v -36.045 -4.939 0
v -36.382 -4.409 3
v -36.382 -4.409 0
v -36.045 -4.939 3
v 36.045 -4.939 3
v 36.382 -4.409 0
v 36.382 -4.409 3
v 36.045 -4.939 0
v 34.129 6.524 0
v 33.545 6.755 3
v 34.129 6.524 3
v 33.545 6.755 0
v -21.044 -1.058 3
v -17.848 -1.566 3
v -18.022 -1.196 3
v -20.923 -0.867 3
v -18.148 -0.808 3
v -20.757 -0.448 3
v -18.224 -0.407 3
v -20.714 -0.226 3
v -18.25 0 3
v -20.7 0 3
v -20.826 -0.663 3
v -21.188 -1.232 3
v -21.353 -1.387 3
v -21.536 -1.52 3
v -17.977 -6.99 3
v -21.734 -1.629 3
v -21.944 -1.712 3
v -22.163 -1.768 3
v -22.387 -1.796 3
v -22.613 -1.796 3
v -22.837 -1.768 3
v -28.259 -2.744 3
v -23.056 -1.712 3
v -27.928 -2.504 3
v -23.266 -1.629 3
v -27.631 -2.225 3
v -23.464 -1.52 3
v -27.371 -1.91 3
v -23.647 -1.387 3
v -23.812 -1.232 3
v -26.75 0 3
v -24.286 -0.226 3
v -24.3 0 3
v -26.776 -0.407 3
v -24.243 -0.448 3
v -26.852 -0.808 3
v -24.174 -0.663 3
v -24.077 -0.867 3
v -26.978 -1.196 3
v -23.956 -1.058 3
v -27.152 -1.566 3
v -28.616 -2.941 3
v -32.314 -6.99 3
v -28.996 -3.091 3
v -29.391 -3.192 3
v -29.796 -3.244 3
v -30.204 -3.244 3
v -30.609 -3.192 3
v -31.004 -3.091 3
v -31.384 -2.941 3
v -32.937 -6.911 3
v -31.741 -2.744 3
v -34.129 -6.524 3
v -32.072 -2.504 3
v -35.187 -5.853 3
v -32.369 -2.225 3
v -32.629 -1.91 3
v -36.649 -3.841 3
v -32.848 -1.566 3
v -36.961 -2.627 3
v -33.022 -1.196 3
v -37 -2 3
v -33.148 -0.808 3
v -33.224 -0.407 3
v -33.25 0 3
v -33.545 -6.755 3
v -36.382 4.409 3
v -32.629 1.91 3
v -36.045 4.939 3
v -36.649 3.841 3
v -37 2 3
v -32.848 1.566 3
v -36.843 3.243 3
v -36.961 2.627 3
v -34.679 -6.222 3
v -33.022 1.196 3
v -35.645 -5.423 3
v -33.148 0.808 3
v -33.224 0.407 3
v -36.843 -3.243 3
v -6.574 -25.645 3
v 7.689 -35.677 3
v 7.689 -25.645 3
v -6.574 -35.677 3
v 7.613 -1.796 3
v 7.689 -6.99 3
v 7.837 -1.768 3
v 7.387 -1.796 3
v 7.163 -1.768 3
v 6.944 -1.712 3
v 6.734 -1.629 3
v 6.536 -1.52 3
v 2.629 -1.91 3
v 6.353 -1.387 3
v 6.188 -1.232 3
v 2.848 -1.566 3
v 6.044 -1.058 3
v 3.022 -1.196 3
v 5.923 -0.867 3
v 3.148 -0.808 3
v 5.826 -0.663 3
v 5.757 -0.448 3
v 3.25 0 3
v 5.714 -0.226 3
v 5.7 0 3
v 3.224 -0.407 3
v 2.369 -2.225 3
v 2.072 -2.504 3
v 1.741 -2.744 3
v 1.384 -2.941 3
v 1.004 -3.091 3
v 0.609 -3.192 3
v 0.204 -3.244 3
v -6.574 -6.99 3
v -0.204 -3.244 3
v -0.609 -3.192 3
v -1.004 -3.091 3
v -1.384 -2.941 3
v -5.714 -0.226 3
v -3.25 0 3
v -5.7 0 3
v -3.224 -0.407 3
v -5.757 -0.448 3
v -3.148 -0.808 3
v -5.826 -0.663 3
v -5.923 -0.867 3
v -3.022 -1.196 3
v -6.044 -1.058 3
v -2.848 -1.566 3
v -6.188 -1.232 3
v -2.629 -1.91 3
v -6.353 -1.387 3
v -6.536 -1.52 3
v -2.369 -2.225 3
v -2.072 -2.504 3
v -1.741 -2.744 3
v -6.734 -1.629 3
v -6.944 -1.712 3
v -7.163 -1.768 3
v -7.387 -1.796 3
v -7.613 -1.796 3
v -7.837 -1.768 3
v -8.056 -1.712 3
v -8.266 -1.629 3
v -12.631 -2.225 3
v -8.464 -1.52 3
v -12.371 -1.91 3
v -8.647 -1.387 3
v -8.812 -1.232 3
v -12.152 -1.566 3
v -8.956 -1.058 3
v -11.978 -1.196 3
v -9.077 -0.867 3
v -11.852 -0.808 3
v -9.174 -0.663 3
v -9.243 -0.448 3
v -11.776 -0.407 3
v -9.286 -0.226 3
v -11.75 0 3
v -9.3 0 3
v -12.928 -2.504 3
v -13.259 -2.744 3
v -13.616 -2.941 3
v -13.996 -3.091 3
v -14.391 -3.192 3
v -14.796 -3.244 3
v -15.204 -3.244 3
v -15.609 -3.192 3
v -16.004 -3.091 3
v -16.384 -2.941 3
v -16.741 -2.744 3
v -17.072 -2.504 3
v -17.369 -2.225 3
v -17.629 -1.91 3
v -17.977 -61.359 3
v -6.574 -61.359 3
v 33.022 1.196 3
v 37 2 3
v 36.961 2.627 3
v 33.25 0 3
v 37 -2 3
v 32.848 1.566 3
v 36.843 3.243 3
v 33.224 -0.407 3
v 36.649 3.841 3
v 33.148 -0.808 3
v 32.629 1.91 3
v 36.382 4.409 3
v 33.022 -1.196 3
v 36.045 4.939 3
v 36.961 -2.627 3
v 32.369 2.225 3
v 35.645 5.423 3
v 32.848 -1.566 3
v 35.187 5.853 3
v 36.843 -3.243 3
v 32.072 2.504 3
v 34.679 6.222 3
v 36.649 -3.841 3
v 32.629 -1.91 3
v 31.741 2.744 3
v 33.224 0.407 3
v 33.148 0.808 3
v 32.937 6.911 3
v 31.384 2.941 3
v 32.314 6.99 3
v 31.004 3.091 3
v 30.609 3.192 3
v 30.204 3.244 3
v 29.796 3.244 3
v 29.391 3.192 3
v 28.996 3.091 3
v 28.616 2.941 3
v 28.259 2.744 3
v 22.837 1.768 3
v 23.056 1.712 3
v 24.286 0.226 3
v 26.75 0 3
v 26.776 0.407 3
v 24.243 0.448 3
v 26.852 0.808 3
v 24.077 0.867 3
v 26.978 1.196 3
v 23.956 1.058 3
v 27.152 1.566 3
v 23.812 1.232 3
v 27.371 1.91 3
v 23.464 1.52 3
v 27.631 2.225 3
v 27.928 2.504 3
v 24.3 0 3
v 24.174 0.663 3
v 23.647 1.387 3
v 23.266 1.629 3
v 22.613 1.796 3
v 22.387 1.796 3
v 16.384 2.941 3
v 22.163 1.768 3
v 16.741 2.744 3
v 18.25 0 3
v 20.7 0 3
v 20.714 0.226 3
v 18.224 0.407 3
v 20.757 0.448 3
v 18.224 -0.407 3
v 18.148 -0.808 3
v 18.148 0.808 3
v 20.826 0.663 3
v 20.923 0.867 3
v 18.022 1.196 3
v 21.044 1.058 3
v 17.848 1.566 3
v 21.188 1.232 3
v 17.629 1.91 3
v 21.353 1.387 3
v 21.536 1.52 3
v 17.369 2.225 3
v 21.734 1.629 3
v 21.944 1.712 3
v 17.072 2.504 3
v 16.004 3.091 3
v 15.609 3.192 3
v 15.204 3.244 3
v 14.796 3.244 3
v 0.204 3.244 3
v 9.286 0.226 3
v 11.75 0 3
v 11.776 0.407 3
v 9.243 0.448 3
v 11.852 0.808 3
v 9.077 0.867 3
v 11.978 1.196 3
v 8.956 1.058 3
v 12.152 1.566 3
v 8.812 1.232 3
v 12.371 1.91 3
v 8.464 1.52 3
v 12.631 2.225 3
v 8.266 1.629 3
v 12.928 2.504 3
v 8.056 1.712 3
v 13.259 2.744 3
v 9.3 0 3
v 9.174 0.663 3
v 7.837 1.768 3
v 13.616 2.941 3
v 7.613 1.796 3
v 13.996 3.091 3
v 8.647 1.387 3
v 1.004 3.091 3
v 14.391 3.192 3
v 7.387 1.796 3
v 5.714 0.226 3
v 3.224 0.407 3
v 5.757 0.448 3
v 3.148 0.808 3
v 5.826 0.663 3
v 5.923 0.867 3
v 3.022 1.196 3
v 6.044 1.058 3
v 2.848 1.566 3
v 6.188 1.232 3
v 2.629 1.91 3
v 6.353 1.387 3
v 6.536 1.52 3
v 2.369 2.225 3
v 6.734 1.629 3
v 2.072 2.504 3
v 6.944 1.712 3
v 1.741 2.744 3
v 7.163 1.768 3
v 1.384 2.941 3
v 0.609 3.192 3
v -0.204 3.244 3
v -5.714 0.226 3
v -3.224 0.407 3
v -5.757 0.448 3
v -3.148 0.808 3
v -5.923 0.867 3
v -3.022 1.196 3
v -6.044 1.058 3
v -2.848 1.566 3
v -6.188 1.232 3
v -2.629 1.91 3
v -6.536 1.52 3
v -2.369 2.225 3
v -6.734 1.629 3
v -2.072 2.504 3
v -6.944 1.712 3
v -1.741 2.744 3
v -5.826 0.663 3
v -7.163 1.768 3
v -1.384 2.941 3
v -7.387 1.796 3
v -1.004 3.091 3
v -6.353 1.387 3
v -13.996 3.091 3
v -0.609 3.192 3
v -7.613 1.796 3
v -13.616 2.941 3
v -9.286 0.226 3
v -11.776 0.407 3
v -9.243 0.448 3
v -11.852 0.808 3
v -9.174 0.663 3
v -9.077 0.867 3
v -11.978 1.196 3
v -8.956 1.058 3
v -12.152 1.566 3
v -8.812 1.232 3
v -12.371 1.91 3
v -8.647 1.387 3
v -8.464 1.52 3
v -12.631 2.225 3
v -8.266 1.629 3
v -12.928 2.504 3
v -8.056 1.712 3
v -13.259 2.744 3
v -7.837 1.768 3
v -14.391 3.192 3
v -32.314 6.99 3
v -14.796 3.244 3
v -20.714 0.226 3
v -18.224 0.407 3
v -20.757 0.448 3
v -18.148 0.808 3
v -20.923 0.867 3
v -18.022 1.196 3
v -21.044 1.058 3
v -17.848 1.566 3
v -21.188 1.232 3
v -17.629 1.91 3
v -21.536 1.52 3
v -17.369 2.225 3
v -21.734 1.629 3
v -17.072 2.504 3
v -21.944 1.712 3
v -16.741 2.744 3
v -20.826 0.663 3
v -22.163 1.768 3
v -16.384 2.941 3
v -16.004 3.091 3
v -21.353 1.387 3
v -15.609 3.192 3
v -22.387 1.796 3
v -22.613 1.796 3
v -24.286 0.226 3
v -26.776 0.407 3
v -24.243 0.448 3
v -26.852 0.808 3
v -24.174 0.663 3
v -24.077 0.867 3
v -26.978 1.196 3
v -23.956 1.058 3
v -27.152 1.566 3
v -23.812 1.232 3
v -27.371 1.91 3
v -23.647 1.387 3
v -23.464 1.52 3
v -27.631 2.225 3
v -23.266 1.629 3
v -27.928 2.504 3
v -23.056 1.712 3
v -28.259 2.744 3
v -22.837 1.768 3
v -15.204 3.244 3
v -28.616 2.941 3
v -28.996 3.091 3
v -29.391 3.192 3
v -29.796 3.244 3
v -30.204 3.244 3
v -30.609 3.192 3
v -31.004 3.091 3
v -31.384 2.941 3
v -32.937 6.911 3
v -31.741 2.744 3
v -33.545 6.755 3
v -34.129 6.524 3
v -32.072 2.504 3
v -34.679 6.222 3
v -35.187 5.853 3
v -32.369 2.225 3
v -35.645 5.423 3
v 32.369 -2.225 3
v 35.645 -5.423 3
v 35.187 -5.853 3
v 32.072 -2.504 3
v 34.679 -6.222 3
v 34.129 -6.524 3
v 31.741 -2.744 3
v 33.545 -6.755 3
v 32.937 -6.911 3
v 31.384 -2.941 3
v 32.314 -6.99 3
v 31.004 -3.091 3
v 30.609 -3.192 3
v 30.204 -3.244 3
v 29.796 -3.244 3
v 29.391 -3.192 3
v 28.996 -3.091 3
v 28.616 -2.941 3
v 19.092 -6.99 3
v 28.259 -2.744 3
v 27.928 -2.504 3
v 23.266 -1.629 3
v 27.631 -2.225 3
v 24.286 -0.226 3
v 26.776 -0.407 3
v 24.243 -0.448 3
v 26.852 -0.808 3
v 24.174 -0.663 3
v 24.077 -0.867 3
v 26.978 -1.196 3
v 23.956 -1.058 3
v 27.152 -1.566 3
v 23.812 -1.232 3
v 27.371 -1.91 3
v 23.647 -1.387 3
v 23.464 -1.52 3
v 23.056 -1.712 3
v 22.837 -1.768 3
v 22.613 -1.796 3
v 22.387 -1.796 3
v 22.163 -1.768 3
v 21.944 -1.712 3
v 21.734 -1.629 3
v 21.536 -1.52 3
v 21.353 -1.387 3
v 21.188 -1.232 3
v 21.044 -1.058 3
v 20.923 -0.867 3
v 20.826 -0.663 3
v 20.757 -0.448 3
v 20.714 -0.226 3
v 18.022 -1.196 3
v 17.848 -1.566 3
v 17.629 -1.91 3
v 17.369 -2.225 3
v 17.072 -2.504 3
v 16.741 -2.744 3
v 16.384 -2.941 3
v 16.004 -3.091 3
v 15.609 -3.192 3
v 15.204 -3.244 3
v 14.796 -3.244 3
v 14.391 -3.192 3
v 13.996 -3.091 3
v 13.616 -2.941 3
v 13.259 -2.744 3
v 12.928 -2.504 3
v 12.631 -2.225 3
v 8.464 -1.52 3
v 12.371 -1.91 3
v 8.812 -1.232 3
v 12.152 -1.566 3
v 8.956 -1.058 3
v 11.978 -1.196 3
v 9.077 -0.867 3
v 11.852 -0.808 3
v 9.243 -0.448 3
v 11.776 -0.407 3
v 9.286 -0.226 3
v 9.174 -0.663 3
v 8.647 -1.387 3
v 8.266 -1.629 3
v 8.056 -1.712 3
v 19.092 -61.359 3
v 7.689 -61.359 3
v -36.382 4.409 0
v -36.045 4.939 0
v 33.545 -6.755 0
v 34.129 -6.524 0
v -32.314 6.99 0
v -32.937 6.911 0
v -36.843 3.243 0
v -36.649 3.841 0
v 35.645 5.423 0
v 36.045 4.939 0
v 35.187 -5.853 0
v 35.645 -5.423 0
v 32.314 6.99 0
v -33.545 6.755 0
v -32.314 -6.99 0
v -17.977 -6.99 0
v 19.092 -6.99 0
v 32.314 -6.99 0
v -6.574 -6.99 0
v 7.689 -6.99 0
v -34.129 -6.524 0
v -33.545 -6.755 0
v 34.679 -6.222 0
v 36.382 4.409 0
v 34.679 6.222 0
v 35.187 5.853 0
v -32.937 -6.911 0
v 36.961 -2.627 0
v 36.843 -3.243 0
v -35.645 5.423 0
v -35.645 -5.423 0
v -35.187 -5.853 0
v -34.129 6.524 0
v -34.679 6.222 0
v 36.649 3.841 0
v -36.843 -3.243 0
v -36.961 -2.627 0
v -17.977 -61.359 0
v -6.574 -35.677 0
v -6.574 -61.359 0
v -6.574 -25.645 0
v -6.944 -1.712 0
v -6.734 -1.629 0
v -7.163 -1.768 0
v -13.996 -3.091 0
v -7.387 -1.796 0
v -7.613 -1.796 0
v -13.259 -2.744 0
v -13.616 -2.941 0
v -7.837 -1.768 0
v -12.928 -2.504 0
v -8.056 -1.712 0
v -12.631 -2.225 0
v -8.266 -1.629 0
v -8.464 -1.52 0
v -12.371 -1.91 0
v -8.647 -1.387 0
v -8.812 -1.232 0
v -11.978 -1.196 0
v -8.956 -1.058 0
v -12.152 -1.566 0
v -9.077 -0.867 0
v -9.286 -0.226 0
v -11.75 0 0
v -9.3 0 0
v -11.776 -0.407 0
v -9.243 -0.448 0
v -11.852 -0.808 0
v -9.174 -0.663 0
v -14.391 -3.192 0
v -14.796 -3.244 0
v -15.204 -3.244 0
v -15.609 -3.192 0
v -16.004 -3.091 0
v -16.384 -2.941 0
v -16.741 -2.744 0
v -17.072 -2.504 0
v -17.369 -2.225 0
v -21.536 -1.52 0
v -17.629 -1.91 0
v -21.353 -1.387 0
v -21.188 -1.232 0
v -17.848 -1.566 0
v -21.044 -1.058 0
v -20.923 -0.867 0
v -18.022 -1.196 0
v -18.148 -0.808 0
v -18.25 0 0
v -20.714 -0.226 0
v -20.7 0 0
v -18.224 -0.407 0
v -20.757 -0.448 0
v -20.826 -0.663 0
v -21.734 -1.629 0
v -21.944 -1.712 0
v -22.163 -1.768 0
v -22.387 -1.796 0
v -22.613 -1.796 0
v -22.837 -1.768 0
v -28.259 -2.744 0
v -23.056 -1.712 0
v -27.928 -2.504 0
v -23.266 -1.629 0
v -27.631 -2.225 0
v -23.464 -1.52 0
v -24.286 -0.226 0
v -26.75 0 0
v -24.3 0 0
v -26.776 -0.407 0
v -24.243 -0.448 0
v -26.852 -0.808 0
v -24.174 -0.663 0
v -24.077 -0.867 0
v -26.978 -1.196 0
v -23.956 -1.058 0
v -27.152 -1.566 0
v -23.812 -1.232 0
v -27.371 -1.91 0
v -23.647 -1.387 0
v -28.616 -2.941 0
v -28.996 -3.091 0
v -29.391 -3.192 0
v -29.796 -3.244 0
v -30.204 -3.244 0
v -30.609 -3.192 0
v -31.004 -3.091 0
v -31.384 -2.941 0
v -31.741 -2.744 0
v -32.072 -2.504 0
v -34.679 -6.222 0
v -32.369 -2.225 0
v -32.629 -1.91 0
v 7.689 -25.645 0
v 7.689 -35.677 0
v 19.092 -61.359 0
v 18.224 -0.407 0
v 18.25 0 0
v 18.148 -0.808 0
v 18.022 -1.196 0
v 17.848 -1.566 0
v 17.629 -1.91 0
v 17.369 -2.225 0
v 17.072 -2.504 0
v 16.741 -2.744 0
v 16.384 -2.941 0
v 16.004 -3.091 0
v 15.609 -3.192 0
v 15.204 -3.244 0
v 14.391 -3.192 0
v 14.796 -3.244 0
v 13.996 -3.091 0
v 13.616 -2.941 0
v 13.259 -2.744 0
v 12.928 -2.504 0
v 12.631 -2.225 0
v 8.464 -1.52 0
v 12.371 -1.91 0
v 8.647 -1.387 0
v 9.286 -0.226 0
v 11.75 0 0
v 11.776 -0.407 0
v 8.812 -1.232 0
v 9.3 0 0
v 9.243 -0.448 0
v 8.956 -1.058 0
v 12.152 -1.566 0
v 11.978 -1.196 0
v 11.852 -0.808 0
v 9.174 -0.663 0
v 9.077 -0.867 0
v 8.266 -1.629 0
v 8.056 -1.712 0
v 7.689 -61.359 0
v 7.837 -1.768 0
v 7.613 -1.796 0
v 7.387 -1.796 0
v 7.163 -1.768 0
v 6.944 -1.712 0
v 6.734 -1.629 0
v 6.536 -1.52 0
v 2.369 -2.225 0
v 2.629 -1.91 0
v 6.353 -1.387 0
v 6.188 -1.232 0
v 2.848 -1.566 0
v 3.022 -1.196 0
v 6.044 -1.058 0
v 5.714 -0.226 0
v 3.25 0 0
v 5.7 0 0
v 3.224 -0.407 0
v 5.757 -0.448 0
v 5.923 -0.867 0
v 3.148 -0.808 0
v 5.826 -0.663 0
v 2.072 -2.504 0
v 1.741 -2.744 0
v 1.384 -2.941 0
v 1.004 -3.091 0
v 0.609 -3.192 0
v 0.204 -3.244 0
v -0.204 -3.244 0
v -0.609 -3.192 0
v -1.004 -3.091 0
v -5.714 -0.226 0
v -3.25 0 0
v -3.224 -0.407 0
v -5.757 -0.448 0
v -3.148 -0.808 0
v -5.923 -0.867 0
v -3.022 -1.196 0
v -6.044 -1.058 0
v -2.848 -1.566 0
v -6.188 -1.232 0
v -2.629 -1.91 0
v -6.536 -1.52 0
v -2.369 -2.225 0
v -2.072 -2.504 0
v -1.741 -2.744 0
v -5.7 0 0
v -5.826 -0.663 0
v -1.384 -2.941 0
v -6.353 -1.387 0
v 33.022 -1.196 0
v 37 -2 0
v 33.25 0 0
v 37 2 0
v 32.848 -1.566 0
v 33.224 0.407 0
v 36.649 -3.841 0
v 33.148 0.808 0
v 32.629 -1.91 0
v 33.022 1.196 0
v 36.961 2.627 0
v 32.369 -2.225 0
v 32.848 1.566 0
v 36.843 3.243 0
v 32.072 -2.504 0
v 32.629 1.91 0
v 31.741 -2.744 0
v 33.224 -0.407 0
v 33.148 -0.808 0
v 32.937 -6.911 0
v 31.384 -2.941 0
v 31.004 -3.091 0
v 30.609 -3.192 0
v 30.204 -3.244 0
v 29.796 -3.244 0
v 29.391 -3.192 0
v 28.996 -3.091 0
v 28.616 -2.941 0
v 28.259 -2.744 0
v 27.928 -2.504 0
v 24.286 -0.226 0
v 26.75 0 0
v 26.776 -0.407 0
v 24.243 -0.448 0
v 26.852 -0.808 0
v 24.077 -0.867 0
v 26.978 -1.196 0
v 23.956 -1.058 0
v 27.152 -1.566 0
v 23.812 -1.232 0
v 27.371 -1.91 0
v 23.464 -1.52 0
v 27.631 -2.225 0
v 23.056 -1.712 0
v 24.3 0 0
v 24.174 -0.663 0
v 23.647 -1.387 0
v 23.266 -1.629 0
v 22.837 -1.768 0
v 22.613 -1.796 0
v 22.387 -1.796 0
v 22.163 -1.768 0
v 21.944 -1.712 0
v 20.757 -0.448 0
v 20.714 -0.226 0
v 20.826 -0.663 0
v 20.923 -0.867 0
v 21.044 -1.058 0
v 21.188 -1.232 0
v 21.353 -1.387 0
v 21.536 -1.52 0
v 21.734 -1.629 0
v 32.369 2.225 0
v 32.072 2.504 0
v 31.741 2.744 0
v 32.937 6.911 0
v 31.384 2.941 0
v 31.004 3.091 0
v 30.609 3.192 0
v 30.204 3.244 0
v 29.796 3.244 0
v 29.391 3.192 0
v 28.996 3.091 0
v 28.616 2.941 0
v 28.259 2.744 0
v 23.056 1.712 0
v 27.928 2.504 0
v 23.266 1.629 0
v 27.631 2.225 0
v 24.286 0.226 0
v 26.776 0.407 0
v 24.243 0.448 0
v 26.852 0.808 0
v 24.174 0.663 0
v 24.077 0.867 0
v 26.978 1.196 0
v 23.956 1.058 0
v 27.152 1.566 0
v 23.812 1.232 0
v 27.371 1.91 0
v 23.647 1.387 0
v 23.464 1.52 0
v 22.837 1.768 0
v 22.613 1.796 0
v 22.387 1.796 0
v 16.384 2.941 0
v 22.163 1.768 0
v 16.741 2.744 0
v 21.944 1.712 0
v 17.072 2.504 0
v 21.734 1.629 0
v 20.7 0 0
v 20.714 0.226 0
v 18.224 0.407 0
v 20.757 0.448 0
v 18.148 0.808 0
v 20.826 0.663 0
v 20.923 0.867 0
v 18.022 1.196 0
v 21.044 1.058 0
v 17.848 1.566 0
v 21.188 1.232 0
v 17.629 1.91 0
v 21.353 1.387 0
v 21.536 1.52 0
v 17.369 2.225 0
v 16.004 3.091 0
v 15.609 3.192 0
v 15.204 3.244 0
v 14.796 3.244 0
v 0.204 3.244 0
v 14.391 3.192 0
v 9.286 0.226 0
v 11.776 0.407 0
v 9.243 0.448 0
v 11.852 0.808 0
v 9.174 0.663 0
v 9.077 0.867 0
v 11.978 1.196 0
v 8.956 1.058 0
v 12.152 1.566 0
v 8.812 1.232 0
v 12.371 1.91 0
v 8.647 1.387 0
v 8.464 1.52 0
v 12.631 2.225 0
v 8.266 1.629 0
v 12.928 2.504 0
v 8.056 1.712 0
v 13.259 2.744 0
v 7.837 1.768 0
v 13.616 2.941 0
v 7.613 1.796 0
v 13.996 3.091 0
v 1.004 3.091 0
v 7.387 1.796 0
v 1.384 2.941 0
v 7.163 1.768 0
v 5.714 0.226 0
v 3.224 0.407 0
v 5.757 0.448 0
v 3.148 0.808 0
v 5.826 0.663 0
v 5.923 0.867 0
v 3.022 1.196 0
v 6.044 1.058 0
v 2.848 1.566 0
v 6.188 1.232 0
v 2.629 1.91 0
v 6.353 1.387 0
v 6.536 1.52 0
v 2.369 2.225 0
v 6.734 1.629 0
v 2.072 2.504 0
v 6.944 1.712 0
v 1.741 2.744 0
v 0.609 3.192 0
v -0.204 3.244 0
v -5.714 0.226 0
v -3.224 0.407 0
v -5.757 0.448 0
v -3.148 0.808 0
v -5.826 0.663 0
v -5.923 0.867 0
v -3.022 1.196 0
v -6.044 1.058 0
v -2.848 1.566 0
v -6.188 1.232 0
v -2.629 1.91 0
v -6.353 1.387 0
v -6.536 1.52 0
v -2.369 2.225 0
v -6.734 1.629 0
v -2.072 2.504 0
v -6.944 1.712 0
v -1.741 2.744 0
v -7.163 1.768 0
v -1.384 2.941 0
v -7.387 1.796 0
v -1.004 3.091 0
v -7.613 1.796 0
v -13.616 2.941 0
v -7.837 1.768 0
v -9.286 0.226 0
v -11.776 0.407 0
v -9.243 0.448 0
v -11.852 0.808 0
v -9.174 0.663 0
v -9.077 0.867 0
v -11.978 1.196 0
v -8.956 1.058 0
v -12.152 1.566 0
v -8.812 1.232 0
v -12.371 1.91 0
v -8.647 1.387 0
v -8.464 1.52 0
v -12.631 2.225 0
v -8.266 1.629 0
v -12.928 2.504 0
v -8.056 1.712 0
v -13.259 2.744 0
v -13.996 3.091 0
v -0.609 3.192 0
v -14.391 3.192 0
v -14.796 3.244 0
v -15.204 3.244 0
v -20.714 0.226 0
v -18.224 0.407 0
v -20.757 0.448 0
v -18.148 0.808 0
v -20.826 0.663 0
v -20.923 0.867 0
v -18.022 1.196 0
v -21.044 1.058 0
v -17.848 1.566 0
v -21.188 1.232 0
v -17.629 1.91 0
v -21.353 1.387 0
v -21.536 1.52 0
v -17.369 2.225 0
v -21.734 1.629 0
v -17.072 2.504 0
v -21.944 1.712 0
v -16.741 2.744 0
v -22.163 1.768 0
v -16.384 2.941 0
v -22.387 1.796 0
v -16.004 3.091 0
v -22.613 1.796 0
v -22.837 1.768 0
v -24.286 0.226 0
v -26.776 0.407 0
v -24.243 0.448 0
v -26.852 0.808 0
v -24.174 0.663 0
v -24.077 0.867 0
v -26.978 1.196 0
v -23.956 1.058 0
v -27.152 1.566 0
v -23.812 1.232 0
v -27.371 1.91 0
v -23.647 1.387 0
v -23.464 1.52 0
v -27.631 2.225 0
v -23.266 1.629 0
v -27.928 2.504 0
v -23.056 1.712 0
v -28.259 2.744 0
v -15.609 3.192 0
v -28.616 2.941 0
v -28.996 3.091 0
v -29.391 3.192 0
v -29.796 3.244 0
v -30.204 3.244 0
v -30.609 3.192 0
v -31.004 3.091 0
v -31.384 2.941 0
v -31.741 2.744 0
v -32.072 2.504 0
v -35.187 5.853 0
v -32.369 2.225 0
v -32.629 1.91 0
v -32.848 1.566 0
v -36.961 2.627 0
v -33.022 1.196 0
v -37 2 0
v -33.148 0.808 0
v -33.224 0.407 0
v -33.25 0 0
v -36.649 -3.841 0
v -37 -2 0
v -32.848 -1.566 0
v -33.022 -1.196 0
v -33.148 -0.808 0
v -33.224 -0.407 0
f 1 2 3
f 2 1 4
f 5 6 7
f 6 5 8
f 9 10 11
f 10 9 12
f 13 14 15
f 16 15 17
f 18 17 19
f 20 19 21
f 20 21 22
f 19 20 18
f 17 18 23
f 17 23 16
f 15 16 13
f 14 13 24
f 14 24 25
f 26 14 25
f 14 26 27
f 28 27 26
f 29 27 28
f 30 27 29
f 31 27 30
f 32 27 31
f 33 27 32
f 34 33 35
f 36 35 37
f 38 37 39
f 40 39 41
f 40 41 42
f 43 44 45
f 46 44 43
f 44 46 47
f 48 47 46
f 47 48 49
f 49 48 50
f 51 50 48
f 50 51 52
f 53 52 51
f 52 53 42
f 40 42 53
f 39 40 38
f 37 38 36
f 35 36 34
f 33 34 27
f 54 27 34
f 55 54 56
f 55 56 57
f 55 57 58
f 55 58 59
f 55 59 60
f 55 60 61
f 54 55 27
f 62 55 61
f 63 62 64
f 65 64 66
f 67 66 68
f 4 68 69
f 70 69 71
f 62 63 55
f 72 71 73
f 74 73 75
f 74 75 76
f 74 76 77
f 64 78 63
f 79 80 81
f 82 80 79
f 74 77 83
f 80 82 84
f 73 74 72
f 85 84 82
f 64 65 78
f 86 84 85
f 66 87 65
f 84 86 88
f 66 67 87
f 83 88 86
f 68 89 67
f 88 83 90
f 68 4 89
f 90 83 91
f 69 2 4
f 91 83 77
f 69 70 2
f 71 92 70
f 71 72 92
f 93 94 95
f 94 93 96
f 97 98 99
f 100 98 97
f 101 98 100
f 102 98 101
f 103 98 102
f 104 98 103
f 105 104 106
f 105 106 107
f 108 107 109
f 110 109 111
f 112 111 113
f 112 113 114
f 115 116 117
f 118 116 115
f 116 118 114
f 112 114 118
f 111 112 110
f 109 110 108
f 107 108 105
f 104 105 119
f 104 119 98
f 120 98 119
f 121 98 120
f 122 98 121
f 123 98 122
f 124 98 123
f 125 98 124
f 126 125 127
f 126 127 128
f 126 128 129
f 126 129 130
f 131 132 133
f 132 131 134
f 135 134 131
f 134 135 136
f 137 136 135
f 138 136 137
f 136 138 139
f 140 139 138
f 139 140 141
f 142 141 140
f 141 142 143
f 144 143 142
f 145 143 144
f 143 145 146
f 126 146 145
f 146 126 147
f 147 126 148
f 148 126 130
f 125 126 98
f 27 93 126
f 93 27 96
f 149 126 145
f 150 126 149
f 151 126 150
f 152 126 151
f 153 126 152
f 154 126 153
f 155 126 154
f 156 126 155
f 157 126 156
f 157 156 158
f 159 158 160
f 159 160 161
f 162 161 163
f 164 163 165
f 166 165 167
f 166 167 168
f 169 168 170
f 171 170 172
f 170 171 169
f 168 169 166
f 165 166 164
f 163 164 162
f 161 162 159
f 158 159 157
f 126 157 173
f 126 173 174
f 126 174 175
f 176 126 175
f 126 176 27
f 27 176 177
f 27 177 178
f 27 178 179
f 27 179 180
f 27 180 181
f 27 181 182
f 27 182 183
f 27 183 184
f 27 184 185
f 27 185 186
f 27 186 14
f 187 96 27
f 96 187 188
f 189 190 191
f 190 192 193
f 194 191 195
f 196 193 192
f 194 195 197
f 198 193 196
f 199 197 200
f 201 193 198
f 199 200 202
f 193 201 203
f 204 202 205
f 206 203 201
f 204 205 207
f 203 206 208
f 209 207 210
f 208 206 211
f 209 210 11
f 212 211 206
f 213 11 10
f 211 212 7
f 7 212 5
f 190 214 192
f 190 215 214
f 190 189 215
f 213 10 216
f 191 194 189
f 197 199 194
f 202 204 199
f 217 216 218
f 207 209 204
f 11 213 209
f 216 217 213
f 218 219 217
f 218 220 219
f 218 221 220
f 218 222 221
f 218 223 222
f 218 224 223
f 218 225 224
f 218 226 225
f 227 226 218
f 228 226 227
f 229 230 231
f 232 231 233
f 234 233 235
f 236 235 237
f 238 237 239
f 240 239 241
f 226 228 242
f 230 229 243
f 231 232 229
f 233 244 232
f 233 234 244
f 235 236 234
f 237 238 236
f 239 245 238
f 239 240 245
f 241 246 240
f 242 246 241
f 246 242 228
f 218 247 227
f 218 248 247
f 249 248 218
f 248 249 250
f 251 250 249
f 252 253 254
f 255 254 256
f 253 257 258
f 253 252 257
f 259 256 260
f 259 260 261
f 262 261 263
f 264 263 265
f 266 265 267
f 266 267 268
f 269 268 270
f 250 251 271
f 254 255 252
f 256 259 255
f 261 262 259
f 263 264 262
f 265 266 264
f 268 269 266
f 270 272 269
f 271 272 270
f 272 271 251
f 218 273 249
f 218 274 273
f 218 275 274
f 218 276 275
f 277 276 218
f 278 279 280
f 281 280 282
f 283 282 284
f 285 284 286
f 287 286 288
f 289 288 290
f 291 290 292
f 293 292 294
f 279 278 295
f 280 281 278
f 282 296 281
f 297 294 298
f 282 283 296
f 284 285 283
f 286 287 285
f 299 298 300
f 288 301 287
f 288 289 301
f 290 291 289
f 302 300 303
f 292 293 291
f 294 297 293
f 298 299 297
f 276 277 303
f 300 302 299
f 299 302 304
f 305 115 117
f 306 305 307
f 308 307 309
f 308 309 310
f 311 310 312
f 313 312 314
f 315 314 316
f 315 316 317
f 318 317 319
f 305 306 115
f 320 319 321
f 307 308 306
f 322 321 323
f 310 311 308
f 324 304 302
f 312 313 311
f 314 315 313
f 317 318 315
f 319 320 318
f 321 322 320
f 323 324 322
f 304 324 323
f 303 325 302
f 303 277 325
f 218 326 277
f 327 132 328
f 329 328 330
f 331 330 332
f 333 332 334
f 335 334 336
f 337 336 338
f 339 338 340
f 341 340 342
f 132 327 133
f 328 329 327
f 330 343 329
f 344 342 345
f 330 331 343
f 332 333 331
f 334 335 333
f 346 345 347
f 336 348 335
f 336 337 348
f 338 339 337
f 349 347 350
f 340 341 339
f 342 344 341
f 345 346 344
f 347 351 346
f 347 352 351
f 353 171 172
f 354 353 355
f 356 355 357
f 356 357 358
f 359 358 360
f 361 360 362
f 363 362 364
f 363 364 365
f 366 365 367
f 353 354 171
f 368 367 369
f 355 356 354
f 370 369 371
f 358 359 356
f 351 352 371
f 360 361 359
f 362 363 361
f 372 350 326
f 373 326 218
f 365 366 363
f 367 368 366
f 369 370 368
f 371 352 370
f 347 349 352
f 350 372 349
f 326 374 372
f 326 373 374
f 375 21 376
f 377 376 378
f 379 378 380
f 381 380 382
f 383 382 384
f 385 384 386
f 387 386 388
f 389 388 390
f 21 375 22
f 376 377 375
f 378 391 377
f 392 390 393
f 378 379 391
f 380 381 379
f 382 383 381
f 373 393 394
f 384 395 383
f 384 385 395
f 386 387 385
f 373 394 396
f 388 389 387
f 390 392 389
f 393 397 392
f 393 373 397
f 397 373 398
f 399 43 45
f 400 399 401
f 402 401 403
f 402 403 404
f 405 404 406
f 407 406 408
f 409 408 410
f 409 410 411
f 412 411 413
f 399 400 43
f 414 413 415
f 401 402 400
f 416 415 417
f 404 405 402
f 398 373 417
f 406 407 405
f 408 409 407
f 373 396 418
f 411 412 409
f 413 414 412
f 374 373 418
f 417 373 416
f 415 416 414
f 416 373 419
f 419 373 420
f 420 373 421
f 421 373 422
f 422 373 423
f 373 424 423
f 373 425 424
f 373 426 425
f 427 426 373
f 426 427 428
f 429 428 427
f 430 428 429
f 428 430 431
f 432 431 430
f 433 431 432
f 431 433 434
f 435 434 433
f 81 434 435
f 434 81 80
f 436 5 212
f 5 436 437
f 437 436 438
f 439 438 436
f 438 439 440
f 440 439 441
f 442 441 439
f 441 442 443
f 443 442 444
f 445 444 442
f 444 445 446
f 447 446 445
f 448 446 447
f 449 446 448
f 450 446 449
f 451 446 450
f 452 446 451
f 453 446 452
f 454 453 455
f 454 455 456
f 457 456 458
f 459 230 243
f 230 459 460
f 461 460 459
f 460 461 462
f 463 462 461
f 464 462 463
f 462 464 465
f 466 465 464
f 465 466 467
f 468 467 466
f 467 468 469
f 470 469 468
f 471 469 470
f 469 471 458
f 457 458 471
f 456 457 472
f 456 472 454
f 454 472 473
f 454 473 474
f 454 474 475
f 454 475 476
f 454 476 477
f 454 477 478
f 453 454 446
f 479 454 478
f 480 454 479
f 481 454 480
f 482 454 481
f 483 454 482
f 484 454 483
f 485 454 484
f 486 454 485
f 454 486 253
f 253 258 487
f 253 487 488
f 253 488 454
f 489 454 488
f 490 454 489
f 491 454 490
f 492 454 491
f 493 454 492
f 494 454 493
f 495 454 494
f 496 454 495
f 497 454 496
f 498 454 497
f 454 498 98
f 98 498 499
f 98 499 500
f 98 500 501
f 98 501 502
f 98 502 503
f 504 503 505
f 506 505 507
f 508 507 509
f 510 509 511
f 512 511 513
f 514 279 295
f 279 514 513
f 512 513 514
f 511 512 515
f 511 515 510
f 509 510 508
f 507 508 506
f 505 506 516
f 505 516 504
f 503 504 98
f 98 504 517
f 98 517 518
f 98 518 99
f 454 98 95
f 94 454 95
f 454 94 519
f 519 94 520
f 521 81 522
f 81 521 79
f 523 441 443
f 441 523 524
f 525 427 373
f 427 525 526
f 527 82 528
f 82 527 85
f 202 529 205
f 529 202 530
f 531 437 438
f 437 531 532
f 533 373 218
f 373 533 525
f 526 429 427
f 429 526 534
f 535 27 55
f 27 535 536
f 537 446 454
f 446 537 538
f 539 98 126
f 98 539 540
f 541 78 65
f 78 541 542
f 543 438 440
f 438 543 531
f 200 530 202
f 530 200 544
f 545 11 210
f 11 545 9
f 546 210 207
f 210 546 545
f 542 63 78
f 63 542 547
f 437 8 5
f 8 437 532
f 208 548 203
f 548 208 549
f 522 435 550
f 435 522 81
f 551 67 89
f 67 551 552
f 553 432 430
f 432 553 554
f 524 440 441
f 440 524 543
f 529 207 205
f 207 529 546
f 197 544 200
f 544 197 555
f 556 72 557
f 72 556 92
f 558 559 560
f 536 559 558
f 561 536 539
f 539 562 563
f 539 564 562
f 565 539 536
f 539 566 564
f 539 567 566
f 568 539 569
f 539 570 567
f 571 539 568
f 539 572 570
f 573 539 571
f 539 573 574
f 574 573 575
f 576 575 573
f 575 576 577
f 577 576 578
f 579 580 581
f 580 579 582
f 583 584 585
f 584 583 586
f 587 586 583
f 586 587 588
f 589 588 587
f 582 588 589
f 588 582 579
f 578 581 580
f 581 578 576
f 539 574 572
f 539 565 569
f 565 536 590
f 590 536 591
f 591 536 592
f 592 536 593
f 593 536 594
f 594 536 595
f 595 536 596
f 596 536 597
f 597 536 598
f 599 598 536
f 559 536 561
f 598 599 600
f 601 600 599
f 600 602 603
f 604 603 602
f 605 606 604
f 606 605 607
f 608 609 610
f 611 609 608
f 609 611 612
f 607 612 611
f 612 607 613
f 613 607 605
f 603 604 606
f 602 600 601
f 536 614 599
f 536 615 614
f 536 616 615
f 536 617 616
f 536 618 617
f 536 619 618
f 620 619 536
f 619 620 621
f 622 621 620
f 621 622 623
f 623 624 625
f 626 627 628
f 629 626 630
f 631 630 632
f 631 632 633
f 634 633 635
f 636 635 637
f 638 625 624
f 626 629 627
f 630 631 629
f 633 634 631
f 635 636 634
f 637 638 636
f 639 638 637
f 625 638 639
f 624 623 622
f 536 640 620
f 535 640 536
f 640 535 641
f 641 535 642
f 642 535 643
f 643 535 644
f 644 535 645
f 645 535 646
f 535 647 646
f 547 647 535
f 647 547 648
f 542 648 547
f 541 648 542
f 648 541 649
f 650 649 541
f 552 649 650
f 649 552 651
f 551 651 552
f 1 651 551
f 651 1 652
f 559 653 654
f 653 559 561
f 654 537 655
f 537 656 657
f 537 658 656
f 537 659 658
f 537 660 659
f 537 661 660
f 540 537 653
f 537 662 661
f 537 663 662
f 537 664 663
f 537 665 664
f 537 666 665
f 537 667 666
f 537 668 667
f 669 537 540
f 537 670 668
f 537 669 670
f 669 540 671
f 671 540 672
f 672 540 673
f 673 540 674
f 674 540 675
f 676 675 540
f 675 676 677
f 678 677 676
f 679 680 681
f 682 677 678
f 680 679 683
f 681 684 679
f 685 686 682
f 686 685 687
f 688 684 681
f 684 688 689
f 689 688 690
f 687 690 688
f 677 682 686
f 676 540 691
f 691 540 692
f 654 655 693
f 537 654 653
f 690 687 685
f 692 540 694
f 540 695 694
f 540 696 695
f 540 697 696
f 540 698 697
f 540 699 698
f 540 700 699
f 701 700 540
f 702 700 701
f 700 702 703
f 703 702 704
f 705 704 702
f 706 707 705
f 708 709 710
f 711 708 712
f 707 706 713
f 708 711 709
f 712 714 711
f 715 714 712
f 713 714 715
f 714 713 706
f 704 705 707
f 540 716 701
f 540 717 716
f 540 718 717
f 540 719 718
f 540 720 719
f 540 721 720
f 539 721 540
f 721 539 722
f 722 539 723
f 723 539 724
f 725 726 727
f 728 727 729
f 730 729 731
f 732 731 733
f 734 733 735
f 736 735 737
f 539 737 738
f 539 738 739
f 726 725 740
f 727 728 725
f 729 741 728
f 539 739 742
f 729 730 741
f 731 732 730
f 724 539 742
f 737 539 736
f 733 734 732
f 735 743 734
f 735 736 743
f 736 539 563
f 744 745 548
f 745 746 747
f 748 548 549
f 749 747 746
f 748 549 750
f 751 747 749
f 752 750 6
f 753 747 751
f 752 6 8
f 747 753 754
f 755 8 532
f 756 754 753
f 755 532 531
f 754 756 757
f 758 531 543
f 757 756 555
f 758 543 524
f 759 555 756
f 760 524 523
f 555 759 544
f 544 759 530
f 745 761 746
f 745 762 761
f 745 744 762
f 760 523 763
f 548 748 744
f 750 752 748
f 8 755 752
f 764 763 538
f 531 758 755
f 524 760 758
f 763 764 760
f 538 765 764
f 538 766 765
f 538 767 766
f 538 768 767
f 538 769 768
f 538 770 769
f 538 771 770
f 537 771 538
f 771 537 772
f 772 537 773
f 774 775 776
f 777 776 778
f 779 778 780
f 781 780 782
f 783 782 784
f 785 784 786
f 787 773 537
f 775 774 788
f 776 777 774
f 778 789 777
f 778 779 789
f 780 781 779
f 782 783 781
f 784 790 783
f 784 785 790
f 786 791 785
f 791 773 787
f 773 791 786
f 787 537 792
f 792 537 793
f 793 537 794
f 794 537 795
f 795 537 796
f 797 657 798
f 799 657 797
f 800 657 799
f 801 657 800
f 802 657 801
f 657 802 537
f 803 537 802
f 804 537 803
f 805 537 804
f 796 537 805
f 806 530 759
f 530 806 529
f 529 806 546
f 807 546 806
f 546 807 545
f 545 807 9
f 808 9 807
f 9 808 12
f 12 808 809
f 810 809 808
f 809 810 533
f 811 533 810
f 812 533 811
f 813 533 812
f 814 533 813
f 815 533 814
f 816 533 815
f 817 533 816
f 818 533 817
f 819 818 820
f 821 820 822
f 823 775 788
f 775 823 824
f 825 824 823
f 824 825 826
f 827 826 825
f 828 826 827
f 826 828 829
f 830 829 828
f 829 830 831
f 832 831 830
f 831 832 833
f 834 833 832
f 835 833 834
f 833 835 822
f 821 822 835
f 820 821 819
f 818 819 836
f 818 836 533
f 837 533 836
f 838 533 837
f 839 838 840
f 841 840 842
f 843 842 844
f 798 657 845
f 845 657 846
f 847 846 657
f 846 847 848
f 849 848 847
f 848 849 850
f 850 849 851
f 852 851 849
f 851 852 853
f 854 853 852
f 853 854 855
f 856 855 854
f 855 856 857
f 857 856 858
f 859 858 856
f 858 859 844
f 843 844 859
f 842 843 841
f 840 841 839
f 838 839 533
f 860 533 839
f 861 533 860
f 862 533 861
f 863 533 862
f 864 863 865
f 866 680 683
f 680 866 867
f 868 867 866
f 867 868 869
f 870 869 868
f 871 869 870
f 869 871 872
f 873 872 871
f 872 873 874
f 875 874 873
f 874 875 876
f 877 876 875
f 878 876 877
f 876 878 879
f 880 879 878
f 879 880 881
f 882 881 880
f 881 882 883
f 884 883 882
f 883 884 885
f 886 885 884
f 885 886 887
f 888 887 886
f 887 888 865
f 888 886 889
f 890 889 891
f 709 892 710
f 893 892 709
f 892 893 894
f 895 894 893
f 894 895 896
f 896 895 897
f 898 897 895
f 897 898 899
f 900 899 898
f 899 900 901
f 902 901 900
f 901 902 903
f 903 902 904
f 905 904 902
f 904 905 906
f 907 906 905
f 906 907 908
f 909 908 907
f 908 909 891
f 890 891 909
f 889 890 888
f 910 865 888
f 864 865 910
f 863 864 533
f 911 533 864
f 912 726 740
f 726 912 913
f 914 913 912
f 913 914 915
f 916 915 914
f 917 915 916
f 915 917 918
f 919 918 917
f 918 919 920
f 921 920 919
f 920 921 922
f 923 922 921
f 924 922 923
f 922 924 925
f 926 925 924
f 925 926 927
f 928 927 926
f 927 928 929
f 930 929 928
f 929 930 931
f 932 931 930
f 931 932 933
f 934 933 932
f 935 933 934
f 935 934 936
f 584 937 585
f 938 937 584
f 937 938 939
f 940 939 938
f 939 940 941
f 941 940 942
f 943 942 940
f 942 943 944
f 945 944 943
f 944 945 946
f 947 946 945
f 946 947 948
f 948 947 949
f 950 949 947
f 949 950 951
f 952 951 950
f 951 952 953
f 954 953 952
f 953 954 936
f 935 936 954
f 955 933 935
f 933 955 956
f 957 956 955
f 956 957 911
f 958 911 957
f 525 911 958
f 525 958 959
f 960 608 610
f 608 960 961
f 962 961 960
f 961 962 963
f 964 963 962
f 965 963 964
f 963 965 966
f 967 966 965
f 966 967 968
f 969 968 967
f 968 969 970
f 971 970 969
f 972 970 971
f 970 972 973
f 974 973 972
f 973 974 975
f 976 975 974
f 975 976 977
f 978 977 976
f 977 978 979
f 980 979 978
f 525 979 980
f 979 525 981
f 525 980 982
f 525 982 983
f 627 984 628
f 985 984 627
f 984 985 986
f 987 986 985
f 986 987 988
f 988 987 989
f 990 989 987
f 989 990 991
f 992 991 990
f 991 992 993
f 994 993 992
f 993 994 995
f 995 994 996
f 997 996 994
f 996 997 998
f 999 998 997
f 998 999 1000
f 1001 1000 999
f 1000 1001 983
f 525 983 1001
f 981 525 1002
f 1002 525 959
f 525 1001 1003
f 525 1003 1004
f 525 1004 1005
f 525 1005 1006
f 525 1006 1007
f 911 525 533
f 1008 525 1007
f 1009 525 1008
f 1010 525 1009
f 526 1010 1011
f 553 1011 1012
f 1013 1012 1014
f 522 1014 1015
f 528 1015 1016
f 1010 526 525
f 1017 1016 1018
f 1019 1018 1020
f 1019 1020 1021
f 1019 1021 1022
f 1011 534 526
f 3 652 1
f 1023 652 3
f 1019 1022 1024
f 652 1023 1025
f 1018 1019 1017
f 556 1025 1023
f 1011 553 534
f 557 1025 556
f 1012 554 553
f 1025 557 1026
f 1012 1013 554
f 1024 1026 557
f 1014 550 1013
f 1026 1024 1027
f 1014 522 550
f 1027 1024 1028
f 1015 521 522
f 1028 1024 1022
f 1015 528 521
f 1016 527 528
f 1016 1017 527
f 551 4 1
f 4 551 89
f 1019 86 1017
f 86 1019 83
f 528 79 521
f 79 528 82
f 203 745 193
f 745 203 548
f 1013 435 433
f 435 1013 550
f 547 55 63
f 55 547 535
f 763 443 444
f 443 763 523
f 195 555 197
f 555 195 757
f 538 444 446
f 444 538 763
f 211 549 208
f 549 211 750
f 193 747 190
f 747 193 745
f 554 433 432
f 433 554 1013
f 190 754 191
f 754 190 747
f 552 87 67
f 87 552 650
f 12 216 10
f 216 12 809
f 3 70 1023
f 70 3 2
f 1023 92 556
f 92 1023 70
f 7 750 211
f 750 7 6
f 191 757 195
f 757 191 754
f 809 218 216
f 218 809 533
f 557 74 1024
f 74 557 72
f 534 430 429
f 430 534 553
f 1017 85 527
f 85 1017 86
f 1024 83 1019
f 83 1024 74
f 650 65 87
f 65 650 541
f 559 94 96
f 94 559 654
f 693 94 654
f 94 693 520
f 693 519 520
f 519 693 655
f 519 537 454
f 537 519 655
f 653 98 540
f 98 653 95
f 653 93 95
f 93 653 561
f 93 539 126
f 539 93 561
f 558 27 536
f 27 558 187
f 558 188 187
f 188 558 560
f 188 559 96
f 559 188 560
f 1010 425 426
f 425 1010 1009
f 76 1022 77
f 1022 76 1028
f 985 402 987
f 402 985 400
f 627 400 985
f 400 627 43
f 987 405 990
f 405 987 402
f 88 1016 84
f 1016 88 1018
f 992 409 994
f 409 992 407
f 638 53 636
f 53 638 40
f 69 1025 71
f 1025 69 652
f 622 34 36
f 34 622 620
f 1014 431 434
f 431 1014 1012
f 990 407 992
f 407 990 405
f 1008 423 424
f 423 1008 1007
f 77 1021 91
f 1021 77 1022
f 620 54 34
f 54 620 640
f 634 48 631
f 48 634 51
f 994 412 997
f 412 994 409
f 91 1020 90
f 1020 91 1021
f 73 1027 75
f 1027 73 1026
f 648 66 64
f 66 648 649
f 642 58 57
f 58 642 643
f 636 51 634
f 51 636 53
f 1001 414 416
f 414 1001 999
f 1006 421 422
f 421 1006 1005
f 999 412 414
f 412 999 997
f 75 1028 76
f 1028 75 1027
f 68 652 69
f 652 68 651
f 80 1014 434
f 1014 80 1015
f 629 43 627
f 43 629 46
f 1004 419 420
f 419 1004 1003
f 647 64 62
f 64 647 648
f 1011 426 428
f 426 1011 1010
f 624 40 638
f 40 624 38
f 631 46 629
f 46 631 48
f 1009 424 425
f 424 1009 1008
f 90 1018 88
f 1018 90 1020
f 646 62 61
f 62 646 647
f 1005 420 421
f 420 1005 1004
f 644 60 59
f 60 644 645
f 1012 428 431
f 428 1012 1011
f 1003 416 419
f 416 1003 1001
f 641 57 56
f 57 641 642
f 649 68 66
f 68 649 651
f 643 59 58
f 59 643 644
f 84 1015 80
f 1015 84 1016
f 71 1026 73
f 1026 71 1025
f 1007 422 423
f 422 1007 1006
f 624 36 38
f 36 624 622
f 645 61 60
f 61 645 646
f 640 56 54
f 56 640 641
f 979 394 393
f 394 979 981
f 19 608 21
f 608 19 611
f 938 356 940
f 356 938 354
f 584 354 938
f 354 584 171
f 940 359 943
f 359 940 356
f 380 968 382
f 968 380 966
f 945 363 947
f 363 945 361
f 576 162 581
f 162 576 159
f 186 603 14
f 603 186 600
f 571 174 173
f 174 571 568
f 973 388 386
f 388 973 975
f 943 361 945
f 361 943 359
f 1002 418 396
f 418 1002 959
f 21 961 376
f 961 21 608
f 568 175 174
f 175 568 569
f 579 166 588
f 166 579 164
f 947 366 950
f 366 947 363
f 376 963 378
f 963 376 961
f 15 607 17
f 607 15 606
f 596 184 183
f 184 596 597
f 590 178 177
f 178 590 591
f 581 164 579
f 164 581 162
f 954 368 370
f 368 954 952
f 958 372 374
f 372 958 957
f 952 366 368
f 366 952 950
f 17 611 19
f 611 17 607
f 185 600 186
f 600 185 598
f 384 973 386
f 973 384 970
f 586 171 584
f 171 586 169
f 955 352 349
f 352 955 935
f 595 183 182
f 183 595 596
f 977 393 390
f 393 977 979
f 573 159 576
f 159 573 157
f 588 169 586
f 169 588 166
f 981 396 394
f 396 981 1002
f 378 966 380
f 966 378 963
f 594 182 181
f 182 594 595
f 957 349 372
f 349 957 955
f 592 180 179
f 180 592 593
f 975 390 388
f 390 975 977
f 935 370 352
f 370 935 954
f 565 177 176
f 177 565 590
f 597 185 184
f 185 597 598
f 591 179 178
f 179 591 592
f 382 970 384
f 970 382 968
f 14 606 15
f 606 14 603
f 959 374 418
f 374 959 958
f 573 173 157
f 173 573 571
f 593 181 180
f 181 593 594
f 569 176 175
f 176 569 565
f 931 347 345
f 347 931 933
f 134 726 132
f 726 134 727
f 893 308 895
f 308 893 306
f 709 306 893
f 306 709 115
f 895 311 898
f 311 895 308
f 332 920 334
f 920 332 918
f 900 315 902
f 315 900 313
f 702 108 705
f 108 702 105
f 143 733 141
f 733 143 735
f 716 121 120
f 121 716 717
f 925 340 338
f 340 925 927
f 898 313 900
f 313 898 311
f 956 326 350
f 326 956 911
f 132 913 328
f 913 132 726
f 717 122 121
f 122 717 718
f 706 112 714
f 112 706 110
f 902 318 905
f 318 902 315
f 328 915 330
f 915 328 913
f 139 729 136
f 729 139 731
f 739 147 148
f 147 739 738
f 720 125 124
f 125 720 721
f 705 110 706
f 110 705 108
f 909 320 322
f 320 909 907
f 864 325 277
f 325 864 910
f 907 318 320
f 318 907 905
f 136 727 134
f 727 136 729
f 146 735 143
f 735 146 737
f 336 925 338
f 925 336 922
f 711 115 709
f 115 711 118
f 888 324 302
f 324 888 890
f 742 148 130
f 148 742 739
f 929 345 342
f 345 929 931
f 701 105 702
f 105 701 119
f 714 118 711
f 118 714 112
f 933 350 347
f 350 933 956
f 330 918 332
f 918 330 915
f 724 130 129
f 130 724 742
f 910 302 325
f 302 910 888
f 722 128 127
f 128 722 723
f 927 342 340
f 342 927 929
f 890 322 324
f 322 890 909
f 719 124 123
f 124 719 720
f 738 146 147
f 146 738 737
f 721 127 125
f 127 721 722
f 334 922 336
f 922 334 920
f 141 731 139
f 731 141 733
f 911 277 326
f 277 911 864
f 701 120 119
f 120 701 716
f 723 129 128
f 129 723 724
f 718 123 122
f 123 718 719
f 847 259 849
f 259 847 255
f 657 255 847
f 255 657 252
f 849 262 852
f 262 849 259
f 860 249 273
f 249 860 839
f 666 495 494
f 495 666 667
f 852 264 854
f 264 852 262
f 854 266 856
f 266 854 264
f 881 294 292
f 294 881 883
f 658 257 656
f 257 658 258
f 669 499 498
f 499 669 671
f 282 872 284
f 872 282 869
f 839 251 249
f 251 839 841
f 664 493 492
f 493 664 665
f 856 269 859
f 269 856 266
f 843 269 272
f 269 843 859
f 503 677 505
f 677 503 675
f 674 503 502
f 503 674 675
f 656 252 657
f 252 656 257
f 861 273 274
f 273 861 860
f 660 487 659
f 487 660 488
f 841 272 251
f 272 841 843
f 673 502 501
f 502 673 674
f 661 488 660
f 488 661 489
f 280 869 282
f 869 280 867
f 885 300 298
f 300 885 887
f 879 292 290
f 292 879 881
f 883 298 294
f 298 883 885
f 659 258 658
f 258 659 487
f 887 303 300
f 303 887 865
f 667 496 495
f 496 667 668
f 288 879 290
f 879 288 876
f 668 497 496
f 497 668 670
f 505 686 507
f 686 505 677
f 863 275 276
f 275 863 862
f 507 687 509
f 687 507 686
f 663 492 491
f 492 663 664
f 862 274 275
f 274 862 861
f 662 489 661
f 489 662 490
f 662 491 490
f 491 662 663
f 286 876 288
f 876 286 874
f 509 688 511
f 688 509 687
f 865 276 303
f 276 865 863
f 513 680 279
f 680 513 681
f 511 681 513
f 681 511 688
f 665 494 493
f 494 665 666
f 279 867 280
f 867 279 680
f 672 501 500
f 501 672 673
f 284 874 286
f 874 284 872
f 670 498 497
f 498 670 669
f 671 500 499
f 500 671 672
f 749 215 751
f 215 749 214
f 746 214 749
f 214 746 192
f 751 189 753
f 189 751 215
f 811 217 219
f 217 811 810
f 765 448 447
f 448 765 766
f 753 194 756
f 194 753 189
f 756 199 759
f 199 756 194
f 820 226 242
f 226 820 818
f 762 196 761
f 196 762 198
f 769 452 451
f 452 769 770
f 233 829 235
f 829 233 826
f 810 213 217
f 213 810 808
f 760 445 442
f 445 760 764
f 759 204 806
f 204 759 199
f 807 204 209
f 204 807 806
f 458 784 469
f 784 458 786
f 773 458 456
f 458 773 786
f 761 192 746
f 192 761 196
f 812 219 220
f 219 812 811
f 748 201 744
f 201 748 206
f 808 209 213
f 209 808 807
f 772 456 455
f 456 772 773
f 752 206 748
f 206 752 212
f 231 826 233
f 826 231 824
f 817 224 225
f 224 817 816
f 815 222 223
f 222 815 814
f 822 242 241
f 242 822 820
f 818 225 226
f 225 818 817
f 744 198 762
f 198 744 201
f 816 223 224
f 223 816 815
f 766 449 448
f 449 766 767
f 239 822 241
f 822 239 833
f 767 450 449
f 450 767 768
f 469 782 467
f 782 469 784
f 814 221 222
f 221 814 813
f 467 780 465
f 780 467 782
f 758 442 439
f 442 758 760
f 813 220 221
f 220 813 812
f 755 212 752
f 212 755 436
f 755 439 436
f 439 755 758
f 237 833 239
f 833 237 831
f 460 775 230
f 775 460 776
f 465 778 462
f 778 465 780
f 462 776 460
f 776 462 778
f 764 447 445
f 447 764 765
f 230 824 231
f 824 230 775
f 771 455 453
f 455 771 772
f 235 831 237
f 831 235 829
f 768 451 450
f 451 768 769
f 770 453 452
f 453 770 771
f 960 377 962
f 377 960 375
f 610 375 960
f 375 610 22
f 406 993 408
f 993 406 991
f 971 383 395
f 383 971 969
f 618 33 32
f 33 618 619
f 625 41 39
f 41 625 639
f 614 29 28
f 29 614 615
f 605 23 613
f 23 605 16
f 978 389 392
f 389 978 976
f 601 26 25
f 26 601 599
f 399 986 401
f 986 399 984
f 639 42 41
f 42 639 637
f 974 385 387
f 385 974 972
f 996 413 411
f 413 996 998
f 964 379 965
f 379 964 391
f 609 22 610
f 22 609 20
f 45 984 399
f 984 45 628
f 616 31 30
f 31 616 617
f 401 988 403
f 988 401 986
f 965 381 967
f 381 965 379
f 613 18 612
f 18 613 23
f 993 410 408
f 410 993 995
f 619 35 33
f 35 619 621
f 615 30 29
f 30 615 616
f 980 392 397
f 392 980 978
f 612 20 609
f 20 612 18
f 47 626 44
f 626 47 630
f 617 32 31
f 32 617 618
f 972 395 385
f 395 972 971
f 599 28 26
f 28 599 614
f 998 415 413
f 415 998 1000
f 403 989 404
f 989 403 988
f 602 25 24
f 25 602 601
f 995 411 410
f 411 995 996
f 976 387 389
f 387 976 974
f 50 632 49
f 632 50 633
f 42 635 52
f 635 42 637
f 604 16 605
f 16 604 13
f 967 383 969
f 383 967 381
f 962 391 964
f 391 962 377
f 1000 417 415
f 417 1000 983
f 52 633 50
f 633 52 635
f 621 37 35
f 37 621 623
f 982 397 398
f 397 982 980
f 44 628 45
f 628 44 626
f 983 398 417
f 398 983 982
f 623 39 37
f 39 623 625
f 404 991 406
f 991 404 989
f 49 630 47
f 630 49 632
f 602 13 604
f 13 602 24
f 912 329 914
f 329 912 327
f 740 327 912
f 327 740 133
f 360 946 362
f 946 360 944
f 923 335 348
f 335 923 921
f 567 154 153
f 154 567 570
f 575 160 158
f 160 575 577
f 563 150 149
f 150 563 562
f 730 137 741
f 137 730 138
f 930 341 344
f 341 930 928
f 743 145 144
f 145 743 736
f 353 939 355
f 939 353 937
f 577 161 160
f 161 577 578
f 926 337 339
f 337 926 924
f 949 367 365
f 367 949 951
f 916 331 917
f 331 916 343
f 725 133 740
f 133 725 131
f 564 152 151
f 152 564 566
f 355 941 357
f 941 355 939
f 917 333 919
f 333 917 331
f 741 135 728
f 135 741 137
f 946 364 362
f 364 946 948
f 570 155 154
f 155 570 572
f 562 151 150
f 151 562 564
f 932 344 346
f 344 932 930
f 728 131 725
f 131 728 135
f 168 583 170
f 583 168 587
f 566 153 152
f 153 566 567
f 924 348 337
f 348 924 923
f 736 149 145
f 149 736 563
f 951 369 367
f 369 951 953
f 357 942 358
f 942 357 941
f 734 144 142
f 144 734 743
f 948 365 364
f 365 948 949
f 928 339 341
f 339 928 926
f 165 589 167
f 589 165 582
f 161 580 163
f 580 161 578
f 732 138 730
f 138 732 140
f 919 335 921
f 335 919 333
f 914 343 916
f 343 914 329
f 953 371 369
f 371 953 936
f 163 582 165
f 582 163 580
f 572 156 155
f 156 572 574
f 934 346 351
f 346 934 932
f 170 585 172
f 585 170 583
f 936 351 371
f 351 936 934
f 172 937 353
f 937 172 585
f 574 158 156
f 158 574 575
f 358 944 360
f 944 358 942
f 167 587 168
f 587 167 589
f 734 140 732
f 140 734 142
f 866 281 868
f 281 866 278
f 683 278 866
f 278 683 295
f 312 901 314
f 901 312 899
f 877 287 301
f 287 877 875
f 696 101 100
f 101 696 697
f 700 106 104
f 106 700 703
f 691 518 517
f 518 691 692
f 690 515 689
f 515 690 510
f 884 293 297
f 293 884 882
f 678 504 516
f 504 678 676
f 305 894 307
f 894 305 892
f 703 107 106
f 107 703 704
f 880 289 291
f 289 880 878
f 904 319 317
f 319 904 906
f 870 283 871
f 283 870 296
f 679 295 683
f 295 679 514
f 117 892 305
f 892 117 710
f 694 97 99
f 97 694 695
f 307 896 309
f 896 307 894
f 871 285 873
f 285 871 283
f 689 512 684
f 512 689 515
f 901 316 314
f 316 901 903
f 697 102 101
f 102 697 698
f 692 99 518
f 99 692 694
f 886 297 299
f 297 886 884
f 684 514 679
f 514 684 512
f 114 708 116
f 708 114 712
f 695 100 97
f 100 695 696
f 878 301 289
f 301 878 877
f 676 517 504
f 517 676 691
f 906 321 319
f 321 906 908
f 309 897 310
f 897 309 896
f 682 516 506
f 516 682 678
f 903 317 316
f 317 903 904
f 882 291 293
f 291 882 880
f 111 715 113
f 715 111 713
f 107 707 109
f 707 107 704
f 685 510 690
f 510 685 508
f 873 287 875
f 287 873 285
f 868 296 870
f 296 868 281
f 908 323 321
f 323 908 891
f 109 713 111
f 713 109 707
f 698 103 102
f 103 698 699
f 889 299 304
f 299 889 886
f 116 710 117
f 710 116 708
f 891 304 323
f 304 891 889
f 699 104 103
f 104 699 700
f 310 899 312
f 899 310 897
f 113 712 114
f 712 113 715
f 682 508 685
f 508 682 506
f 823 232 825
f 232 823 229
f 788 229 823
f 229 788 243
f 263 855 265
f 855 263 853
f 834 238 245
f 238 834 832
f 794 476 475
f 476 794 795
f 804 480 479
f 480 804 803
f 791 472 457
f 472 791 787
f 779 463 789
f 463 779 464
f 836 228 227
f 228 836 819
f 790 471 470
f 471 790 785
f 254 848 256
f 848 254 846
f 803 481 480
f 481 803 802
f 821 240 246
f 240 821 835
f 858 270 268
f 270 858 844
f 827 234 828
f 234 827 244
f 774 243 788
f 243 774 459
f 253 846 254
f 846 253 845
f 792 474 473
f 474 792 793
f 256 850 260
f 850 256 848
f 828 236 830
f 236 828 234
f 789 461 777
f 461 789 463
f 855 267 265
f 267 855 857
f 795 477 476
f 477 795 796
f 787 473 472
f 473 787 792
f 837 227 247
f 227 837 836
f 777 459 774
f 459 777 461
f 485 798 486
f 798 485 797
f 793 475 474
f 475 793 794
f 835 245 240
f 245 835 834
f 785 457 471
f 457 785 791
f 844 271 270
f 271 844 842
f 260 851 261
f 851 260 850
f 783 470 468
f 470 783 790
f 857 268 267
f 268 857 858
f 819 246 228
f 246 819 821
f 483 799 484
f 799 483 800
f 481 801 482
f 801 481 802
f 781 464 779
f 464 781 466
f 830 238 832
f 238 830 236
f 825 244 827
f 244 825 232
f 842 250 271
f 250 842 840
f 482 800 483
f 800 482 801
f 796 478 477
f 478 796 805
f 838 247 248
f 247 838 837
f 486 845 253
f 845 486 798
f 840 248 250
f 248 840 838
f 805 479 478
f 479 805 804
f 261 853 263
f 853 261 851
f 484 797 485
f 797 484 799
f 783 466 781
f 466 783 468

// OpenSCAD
$fn = 50;


difference() {
	union() {
		hull() {
			translate(v = [-32.0000000000, 2.0000000000, 0]) {
				cylinder(h = 3, r = 5);
			}
			translate(v = [32.0000000000, 2.0000000000, 0]) {
				cylinder(h = 3, r = 5);
			}
			translate(v = [-32.0000000000, -2.0000000000, 0]) {
				cylinder(h = 3, r = 5);
			}
			translate(v = [32.0000000000, -2.0000000000, 0]) {
				cylinder(h = 3, r = 5);
			}
		}
		translate(v = [0, -5, 0]) {
			linear_extrude(height = 3) {
				text(font = "DejaVu Sans Mono:style=Bold", halign = "center", size = 57.0000000000, text = "H", valign = "top");
			}
		}
	}
	union() {
		translate(v = [-30.0000000000, 0.0000000000, 0]) {
			translate(v = [0, 0, -100]) {
				cylinder(h = 200, r = 3.2500000000);
			}
		}
		translate(v = [-15.0000000000, 0.0000000000, 0]) {
			translate(v = [0, 0, -100]) {
				cylinder(h = 200, r = 3.2500000000);
			}
		}
		translate(v = [0, 0, -100]) {
			cylinder(h = 200, r = 3.2500000000);
		}
		translate(v = [15.0000000000, 0.0000000000, 0]) {
			translate(v = [0, 0, -100]) {
				cylinder(h = 200, r = 3.2500000000);
			}
		}
		translate(v = [30.0000000000, 0.0000000000, 0]) {
			translate(v = [0, 0, -100]) {
				cylinder(h = 200, r = 3.2500000000);
			}
		}
		translate(v = [-30.0000000000, 0.0000000000, 0]) {
			translate(v = [0, 0, -100]) {
				cylinder(h = 200, r = 1.8000000000);
			}
		}
		translate(v = [-22.5000000000, 0.0000000000, 0]) {
			translate(v = [0, 0, -100]) {
				cylinder(h = 200, r = 1.8000000000);
			}
		}
		translate(v = [-15.0000000000, 0.0000000000, 0]) {
			translate(v = [0, 0, -100]) {
				cylinder(h = 200, r = 1.8000000000);
			}
		}
		translate(v = [-7.5000000000, 0.0000000000, 0]) {
			translate(v = [0, 0, -100]) {
				cylinder(h = 200, r = 1.8000000000);
			}
		}
		translate(v = [0, 0, -100]) {
			cylinder(h = 200, r = 1.8000000000);
		}
		translate(v = [7.5000000000, 0.0000000000, 0]) {
			translate(v = [0, 0, -100]) {
				cylinder(h = 200, r = 1.8000000000);
			}
		}
		translate(v = [15.0000000000, 0.0000000000, 0]) {
			translate(v = [0, 0, -100]) {
				cylinder(h = 200, r = 1.8000000000);
			}
		}
		translate(v = [22.5000000000, 0.0000000000, 0]) {
			translate(v = [0, 0, -100]) {
				cylinder(h = 200, r = 1.8000000000);
			}
		}
		translate(v = [30.0000000000, 0.0000000000, 0]) {
			translate(v = [0, 0, -100]) {
				cylinder(h = 200, r = 1.8000000000);
			}
		}
	}
}
